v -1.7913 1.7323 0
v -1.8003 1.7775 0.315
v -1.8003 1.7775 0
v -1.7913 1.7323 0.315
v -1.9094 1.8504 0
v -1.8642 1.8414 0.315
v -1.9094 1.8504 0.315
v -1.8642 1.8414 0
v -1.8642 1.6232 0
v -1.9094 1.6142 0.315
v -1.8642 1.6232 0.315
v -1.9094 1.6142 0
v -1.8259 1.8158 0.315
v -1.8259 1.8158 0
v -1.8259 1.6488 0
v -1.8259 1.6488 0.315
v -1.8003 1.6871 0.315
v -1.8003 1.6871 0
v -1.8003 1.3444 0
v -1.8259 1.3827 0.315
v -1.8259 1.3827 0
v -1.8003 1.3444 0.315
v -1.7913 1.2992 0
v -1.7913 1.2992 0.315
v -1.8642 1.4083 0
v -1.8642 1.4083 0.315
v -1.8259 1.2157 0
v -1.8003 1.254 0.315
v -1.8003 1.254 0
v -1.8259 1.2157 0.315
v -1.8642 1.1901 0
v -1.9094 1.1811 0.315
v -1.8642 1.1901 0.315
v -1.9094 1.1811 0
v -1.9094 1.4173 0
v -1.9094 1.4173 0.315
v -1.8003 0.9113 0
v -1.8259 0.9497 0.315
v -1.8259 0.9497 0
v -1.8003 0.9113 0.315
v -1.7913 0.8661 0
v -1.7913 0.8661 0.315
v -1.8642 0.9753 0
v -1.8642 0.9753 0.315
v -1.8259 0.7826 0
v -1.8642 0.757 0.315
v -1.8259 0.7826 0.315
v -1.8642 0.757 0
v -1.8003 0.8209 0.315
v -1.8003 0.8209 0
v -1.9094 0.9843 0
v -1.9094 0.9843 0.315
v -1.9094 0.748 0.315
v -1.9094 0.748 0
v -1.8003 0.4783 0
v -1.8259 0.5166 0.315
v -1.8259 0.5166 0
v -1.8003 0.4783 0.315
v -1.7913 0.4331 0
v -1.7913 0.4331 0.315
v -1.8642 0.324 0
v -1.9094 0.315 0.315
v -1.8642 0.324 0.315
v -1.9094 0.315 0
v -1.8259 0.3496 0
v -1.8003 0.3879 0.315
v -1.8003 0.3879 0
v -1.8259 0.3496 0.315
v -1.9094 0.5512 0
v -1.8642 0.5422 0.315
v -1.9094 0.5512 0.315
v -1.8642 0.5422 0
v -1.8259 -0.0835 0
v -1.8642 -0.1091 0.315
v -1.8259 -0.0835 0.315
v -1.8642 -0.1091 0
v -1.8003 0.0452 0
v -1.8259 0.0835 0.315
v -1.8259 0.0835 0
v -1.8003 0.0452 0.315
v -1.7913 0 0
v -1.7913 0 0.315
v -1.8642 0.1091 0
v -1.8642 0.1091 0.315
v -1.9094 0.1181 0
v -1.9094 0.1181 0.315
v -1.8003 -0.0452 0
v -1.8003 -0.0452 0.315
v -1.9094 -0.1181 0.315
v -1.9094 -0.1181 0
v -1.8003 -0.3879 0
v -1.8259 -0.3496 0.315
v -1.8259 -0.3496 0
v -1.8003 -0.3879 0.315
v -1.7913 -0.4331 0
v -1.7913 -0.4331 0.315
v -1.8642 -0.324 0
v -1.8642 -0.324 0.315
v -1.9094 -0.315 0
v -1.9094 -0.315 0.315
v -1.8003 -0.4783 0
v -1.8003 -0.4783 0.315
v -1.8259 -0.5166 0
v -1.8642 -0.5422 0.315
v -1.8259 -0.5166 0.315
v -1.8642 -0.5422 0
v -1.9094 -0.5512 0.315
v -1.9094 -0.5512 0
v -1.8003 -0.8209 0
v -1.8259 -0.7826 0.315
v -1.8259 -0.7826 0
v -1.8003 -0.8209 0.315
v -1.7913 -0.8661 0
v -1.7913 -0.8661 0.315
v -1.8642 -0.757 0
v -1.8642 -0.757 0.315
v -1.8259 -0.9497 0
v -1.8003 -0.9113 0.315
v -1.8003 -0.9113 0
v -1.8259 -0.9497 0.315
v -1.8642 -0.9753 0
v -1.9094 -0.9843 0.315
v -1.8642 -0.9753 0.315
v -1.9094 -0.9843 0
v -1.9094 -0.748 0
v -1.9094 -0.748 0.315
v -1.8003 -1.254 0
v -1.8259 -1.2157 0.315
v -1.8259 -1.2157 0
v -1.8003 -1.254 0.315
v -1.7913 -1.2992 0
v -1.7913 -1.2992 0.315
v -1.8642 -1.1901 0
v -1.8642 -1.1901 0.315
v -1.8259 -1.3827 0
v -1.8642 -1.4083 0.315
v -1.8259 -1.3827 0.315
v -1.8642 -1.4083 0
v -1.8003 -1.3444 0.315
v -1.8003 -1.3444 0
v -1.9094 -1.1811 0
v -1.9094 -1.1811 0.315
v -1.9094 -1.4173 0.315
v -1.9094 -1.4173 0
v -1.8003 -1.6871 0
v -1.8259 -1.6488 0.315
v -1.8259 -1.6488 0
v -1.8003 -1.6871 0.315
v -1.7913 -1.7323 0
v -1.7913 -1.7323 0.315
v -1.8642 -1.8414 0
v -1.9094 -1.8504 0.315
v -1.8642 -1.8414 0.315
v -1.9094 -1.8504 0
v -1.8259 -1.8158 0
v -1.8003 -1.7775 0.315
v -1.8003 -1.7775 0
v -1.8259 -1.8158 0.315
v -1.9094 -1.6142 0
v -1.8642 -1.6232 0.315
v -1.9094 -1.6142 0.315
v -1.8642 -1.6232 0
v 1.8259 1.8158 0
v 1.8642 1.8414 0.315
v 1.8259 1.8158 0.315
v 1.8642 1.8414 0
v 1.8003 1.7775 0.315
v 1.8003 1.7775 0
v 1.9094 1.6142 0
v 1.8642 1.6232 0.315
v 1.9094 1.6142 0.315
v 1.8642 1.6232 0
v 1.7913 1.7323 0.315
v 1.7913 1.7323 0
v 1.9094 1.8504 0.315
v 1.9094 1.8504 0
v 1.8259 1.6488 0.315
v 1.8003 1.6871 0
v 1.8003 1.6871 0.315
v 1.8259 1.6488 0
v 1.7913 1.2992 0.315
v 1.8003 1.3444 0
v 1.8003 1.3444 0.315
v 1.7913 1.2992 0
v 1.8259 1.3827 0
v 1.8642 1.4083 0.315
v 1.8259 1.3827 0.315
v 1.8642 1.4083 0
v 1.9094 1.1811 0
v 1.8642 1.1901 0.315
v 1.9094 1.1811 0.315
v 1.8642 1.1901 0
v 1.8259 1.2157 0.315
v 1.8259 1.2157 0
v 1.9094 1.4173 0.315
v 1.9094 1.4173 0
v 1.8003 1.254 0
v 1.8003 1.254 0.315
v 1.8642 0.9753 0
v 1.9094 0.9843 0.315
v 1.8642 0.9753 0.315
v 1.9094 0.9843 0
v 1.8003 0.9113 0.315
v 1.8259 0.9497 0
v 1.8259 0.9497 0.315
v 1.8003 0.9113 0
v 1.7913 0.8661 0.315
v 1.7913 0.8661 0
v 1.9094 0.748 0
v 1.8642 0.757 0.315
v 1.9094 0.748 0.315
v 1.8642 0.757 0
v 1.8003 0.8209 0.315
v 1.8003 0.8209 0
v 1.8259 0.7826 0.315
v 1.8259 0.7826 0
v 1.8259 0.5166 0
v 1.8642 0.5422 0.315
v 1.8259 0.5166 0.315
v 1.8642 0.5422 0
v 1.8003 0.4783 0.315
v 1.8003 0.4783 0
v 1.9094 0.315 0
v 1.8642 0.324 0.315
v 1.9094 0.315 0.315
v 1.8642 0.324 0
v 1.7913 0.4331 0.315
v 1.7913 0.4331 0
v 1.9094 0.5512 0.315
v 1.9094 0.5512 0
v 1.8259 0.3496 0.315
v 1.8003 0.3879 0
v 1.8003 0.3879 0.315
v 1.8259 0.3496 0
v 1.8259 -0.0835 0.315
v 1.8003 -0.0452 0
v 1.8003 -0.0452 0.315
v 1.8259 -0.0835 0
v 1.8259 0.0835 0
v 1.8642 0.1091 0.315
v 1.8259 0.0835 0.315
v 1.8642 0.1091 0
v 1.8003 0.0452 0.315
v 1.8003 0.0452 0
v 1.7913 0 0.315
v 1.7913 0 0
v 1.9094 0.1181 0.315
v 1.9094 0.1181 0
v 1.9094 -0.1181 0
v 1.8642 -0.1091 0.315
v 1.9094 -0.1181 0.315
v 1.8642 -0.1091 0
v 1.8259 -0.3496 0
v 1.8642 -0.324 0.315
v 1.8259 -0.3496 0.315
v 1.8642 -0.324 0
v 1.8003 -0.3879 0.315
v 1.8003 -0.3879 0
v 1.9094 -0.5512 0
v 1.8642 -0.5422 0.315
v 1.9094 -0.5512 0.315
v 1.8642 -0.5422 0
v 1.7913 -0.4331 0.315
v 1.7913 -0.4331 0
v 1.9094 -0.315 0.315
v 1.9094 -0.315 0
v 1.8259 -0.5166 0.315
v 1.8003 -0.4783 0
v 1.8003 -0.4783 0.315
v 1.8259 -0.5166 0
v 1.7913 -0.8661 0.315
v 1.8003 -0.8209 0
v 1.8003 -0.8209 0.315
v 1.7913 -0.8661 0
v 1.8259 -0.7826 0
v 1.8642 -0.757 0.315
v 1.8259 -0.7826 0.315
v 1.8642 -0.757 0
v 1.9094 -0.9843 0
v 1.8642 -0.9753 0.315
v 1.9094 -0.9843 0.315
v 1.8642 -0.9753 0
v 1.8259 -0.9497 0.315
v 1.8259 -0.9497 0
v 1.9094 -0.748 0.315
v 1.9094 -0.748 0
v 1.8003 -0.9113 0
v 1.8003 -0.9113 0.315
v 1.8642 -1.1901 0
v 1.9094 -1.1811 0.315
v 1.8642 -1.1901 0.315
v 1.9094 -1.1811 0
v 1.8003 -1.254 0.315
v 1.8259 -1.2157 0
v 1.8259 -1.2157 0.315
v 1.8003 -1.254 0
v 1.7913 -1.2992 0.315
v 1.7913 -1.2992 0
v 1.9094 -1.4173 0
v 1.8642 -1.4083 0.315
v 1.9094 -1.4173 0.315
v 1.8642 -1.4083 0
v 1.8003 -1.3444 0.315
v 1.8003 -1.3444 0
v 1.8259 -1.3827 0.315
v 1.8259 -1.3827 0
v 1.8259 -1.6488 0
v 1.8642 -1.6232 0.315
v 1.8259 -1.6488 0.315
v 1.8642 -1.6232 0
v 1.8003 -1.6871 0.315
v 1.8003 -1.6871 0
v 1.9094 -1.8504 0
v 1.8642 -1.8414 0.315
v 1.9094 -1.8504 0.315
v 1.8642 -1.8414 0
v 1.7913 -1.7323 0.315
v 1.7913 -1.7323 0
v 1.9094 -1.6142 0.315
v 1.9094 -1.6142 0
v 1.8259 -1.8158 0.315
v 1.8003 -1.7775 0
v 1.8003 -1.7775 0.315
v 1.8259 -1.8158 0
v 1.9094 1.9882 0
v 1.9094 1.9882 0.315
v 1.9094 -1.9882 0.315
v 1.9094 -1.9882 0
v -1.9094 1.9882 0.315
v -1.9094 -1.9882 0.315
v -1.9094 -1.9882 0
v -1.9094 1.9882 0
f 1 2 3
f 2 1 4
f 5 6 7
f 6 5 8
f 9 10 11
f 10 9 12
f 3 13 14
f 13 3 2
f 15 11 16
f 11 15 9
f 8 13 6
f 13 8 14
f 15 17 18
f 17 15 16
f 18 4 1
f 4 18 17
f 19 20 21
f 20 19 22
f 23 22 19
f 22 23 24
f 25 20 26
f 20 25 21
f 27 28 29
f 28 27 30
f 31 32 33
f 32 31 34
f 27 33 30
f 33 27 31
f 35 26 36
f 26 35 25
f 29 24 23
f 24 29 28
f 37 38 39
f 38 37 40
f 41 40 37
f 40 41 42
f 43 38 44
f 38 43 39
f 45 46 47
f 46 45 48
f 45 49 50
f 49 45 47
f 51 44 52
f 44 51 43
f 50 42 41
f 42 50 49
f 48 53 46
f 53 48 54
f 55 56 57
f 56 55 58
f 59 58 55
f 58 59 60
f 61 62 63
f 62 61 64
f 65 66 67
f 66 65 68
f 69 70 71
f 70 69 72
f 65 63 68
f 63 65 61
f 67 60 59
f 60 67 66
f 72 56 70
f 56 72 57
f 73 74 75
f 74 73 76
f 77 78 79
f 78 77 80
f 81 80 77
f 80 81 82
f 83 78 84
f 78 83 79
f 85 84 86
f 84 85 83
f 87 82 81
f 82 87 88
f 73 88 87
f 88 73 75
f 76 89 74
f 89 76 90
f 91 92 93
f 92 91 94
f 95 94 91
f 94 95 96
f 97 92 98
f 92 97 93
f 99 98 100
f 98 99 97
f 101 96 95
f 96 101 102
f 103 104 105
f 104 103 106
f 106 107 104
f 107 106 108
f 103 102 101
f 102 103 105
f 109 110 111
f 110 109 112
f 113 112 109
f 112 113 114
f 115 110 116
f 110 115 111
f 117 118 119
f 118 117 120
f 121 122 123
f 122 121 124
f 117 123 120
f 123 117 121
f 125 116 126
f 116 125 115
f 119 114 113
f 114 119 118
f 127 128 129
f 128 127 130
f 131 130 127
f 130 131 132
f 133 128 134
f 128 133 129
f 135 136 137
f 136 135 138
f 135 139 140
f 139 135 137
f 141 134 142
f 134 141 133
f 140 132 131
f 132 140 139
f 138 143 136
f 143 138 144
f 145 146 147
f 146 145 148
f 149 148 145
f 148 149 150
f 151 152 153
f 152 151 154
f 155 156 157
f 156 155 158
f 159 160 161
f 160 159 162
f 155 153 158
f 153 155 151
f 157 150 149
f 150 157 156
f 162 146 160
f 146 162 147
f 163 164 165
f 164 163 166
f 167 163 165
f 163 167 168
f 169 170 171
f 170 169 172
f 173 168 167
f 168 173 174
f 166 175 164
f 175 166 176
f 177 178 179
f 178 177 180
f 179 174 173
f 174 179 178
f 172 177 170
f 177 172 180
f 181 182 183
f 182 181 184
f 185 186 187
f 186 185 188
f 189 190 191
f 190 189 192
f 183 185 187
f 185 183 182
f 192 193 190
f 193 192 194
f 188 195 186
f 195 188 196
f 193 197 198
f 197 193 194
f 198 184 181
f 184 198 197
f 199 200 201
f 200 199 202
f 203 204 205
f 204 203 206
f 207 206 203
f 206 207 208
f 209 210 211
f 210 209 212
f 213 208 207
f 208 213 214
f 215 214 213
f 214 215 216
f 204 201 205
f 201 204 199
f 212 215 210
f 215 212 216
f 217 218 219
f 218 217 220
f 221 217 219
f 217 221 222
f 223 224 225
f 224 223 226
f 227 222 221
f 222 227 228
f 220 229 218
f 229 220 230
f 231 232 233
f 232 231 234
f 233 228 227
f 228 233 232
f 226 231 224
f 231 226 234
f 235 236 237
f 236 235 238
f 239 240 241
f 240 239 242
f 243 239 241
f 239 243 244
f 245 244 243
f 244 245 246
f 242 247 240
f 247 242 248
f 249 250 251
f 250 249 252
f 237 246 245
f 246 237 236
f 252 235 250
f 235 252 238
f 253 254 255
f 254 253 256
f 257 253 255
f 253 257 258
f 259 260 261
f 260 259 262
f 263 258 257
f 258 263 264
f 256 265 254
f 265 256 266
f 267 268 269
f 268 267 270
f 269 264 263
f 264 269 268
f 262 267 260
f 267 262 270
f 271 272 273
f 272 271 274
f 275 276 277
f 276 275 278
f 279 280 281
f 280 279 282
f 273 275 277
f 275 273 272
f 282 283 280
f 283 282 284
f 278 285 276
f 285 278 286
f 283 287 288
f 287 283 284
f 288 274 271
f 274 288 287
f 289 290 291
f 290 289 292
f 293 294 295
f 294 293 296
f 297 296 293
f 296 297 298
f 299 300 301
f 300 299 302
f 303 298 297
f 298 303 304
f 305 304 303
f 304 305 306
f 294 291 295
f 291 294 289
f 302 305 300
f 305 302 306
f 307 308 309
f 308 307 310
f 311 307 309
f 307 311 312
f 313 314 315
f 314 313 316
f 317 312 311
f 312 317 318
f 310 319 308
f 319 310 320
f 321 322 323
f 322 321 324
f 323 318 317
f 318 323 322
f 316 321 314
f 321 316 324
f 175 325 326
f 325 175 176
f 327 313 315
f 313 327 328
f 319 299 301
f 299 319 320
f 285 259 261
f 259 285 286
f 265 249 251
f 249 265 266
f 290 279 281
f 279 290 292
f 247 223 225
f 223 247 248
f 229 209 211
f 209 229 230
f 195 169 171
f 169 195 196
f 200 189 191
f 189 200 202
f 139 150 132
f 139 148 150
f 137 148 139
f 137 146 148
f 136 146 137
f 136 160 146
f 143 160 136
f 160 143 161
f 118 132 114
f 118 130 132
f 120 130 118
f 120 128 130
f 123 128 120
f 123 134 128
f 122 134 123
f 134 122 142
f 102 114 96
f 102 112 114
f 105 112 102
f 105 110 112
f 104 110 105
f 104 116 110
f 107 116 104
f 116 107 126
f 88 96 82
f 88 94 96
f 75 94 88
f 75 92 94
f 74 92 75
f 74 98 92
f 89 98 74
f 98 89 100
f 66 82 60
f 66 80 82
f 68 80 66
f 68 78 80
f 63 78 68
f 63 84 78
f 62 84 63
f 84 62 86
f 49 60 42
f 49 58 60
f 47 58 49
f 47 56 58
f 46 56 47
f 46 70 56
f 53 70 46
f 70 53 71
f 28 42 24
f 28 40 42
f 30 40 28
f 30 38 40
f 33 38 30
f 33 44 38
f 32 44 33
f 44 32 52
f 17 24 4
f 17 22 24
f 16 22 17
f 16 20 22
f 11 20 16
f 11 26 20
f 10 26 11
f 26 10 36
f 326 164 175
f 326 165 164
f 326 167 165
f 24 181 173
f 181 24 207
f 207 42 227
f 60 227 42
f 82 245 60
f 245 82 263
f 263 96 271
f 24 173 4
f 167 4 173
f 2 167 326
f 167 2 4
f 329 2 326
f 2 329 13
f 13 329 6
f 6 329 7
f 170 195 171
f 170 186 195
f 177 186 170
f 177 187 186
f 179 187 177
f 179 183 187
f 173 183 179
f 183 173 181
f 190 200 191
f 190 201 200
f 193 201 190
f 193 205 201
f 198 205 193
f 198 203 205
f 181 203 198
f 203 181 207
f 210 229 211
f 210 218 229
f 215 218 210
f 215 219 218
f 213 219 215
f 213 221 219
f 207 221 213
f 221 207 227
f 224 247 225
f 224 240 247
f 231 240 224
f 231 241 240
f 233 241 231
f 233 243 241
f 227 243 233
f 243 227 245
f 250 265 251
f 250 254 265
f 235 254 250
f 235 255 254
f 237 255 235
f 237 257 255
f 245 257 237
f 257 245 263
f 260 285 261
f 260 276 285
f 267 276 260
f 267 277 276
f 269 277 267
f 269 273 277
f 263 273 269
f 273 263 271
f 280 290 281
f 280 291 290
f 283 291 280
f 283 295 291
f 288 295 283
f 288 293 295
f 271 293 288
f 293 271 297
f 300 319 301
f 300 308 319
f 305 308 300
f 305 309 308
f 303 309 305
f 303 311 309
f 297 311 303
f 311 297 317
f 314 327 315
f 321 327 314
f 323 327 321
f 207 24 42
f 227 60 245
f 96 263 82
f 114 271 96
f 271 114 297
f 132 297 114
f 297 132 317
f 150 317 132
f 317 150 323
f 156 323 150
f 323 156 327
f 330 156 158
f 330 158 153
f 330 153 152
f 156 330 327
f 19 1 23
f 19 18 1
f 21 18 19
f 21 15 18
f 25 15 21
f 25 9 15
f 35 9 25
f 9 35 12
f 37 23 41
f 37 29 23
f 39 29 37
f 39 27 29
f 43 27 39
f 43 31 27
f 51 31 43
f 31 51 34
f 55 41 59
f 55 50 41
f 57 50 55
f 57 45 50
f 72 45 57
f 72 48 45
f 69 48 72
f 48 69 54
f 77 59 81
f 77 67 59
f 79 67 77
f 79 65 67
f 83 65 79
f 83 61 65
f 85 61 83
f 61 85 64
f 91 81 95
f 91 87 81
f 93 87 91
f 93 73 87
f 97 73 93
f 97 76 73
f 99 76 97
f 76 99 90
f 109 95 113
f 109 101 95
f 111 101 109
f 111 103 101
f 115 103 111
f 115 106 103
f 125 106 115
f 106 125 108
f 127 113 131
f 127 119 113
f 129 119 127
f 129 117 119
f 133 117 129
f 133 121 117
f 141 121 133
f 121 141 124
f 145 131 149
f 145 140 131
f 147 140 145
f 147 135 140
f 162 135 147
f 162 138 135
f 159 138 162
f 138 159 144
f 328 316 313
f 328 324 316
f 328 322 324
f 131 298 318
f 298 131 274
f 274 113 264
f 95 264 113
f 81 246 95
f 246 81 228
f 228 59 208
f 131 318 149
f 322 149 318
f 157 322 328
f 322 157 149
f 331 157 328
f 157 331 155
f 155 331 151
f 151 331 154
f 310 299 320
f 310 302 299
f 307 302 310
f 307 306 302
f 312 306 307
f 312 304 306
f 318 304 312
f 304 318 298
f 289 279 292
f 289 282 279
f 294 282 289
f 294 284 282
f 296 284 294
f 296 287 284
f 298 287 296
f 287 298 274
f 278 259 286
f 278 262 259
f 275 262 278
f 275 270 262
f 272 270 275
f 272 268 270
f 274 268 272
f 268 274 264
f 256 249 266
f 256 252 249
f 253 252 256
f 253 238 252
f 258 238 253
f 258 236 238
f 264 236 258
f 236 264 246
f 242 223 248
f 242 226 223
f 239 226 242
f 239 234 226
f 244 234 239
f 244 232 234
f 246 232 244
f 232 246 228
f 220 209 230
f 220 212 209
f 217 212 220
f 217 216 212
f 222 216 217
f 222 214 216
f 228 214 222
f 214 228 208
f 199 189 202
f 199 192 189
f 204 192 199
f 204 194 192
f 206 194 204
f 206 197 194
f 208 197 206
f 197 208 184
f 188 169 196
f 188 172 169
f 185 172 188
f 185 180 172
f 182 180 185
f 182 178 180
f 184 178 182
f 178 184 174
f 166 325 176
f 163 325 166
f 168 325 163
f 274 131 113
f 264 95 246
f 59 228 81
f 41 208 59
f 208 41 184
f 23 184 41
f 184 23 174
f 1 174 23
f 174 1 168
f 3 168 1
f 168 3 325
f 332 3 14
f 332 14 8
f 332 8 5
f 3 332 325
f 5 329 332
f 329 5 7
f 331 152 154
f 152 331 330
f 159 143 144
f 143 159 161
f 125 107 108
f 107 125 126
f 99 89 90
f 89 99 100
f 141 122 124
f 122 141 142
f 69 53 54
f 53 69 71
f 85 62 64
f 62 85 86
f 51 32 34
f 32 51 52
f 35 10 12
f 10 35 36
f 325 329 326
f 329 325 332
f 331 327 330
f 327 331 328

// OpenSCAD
// file: defines.scad
w = 9.7;
h = 10.10;
t = 2.5;
pcb_t = 0.8;
pin_fragments = 16;

scale = 1/2.54;
// main file
include <defines.scad>

// Pcb

module Pcb() {
  color("Green")
  translate([-w/2, -h/2])
    cube(size = [w, h, pcb_t], center = false);

}

// Pin drill

module PadPin(o_x, o_y, d_x, d_y, cnt) {
  color("Red")
  for(i = [0 : cnt-1]) {
    translate([o_x + i * d_x, o_y + i * d_y, -0.5])
      cylinder(h = 2, r = 0.30, $fn = pin_fragments);
  }
}

module PadDrills() {
    PadPin(-w/2, h/2 - 0.65, 0, -1.1, 12);
    PadPin( w/2, h/2 - 0.65, 0, -1.1, 12);
}

// Combine together

/*Pcb();*/
scale(scale)
difference() {
  union() {
    Pcb();
  }

	PadDrills();
}
